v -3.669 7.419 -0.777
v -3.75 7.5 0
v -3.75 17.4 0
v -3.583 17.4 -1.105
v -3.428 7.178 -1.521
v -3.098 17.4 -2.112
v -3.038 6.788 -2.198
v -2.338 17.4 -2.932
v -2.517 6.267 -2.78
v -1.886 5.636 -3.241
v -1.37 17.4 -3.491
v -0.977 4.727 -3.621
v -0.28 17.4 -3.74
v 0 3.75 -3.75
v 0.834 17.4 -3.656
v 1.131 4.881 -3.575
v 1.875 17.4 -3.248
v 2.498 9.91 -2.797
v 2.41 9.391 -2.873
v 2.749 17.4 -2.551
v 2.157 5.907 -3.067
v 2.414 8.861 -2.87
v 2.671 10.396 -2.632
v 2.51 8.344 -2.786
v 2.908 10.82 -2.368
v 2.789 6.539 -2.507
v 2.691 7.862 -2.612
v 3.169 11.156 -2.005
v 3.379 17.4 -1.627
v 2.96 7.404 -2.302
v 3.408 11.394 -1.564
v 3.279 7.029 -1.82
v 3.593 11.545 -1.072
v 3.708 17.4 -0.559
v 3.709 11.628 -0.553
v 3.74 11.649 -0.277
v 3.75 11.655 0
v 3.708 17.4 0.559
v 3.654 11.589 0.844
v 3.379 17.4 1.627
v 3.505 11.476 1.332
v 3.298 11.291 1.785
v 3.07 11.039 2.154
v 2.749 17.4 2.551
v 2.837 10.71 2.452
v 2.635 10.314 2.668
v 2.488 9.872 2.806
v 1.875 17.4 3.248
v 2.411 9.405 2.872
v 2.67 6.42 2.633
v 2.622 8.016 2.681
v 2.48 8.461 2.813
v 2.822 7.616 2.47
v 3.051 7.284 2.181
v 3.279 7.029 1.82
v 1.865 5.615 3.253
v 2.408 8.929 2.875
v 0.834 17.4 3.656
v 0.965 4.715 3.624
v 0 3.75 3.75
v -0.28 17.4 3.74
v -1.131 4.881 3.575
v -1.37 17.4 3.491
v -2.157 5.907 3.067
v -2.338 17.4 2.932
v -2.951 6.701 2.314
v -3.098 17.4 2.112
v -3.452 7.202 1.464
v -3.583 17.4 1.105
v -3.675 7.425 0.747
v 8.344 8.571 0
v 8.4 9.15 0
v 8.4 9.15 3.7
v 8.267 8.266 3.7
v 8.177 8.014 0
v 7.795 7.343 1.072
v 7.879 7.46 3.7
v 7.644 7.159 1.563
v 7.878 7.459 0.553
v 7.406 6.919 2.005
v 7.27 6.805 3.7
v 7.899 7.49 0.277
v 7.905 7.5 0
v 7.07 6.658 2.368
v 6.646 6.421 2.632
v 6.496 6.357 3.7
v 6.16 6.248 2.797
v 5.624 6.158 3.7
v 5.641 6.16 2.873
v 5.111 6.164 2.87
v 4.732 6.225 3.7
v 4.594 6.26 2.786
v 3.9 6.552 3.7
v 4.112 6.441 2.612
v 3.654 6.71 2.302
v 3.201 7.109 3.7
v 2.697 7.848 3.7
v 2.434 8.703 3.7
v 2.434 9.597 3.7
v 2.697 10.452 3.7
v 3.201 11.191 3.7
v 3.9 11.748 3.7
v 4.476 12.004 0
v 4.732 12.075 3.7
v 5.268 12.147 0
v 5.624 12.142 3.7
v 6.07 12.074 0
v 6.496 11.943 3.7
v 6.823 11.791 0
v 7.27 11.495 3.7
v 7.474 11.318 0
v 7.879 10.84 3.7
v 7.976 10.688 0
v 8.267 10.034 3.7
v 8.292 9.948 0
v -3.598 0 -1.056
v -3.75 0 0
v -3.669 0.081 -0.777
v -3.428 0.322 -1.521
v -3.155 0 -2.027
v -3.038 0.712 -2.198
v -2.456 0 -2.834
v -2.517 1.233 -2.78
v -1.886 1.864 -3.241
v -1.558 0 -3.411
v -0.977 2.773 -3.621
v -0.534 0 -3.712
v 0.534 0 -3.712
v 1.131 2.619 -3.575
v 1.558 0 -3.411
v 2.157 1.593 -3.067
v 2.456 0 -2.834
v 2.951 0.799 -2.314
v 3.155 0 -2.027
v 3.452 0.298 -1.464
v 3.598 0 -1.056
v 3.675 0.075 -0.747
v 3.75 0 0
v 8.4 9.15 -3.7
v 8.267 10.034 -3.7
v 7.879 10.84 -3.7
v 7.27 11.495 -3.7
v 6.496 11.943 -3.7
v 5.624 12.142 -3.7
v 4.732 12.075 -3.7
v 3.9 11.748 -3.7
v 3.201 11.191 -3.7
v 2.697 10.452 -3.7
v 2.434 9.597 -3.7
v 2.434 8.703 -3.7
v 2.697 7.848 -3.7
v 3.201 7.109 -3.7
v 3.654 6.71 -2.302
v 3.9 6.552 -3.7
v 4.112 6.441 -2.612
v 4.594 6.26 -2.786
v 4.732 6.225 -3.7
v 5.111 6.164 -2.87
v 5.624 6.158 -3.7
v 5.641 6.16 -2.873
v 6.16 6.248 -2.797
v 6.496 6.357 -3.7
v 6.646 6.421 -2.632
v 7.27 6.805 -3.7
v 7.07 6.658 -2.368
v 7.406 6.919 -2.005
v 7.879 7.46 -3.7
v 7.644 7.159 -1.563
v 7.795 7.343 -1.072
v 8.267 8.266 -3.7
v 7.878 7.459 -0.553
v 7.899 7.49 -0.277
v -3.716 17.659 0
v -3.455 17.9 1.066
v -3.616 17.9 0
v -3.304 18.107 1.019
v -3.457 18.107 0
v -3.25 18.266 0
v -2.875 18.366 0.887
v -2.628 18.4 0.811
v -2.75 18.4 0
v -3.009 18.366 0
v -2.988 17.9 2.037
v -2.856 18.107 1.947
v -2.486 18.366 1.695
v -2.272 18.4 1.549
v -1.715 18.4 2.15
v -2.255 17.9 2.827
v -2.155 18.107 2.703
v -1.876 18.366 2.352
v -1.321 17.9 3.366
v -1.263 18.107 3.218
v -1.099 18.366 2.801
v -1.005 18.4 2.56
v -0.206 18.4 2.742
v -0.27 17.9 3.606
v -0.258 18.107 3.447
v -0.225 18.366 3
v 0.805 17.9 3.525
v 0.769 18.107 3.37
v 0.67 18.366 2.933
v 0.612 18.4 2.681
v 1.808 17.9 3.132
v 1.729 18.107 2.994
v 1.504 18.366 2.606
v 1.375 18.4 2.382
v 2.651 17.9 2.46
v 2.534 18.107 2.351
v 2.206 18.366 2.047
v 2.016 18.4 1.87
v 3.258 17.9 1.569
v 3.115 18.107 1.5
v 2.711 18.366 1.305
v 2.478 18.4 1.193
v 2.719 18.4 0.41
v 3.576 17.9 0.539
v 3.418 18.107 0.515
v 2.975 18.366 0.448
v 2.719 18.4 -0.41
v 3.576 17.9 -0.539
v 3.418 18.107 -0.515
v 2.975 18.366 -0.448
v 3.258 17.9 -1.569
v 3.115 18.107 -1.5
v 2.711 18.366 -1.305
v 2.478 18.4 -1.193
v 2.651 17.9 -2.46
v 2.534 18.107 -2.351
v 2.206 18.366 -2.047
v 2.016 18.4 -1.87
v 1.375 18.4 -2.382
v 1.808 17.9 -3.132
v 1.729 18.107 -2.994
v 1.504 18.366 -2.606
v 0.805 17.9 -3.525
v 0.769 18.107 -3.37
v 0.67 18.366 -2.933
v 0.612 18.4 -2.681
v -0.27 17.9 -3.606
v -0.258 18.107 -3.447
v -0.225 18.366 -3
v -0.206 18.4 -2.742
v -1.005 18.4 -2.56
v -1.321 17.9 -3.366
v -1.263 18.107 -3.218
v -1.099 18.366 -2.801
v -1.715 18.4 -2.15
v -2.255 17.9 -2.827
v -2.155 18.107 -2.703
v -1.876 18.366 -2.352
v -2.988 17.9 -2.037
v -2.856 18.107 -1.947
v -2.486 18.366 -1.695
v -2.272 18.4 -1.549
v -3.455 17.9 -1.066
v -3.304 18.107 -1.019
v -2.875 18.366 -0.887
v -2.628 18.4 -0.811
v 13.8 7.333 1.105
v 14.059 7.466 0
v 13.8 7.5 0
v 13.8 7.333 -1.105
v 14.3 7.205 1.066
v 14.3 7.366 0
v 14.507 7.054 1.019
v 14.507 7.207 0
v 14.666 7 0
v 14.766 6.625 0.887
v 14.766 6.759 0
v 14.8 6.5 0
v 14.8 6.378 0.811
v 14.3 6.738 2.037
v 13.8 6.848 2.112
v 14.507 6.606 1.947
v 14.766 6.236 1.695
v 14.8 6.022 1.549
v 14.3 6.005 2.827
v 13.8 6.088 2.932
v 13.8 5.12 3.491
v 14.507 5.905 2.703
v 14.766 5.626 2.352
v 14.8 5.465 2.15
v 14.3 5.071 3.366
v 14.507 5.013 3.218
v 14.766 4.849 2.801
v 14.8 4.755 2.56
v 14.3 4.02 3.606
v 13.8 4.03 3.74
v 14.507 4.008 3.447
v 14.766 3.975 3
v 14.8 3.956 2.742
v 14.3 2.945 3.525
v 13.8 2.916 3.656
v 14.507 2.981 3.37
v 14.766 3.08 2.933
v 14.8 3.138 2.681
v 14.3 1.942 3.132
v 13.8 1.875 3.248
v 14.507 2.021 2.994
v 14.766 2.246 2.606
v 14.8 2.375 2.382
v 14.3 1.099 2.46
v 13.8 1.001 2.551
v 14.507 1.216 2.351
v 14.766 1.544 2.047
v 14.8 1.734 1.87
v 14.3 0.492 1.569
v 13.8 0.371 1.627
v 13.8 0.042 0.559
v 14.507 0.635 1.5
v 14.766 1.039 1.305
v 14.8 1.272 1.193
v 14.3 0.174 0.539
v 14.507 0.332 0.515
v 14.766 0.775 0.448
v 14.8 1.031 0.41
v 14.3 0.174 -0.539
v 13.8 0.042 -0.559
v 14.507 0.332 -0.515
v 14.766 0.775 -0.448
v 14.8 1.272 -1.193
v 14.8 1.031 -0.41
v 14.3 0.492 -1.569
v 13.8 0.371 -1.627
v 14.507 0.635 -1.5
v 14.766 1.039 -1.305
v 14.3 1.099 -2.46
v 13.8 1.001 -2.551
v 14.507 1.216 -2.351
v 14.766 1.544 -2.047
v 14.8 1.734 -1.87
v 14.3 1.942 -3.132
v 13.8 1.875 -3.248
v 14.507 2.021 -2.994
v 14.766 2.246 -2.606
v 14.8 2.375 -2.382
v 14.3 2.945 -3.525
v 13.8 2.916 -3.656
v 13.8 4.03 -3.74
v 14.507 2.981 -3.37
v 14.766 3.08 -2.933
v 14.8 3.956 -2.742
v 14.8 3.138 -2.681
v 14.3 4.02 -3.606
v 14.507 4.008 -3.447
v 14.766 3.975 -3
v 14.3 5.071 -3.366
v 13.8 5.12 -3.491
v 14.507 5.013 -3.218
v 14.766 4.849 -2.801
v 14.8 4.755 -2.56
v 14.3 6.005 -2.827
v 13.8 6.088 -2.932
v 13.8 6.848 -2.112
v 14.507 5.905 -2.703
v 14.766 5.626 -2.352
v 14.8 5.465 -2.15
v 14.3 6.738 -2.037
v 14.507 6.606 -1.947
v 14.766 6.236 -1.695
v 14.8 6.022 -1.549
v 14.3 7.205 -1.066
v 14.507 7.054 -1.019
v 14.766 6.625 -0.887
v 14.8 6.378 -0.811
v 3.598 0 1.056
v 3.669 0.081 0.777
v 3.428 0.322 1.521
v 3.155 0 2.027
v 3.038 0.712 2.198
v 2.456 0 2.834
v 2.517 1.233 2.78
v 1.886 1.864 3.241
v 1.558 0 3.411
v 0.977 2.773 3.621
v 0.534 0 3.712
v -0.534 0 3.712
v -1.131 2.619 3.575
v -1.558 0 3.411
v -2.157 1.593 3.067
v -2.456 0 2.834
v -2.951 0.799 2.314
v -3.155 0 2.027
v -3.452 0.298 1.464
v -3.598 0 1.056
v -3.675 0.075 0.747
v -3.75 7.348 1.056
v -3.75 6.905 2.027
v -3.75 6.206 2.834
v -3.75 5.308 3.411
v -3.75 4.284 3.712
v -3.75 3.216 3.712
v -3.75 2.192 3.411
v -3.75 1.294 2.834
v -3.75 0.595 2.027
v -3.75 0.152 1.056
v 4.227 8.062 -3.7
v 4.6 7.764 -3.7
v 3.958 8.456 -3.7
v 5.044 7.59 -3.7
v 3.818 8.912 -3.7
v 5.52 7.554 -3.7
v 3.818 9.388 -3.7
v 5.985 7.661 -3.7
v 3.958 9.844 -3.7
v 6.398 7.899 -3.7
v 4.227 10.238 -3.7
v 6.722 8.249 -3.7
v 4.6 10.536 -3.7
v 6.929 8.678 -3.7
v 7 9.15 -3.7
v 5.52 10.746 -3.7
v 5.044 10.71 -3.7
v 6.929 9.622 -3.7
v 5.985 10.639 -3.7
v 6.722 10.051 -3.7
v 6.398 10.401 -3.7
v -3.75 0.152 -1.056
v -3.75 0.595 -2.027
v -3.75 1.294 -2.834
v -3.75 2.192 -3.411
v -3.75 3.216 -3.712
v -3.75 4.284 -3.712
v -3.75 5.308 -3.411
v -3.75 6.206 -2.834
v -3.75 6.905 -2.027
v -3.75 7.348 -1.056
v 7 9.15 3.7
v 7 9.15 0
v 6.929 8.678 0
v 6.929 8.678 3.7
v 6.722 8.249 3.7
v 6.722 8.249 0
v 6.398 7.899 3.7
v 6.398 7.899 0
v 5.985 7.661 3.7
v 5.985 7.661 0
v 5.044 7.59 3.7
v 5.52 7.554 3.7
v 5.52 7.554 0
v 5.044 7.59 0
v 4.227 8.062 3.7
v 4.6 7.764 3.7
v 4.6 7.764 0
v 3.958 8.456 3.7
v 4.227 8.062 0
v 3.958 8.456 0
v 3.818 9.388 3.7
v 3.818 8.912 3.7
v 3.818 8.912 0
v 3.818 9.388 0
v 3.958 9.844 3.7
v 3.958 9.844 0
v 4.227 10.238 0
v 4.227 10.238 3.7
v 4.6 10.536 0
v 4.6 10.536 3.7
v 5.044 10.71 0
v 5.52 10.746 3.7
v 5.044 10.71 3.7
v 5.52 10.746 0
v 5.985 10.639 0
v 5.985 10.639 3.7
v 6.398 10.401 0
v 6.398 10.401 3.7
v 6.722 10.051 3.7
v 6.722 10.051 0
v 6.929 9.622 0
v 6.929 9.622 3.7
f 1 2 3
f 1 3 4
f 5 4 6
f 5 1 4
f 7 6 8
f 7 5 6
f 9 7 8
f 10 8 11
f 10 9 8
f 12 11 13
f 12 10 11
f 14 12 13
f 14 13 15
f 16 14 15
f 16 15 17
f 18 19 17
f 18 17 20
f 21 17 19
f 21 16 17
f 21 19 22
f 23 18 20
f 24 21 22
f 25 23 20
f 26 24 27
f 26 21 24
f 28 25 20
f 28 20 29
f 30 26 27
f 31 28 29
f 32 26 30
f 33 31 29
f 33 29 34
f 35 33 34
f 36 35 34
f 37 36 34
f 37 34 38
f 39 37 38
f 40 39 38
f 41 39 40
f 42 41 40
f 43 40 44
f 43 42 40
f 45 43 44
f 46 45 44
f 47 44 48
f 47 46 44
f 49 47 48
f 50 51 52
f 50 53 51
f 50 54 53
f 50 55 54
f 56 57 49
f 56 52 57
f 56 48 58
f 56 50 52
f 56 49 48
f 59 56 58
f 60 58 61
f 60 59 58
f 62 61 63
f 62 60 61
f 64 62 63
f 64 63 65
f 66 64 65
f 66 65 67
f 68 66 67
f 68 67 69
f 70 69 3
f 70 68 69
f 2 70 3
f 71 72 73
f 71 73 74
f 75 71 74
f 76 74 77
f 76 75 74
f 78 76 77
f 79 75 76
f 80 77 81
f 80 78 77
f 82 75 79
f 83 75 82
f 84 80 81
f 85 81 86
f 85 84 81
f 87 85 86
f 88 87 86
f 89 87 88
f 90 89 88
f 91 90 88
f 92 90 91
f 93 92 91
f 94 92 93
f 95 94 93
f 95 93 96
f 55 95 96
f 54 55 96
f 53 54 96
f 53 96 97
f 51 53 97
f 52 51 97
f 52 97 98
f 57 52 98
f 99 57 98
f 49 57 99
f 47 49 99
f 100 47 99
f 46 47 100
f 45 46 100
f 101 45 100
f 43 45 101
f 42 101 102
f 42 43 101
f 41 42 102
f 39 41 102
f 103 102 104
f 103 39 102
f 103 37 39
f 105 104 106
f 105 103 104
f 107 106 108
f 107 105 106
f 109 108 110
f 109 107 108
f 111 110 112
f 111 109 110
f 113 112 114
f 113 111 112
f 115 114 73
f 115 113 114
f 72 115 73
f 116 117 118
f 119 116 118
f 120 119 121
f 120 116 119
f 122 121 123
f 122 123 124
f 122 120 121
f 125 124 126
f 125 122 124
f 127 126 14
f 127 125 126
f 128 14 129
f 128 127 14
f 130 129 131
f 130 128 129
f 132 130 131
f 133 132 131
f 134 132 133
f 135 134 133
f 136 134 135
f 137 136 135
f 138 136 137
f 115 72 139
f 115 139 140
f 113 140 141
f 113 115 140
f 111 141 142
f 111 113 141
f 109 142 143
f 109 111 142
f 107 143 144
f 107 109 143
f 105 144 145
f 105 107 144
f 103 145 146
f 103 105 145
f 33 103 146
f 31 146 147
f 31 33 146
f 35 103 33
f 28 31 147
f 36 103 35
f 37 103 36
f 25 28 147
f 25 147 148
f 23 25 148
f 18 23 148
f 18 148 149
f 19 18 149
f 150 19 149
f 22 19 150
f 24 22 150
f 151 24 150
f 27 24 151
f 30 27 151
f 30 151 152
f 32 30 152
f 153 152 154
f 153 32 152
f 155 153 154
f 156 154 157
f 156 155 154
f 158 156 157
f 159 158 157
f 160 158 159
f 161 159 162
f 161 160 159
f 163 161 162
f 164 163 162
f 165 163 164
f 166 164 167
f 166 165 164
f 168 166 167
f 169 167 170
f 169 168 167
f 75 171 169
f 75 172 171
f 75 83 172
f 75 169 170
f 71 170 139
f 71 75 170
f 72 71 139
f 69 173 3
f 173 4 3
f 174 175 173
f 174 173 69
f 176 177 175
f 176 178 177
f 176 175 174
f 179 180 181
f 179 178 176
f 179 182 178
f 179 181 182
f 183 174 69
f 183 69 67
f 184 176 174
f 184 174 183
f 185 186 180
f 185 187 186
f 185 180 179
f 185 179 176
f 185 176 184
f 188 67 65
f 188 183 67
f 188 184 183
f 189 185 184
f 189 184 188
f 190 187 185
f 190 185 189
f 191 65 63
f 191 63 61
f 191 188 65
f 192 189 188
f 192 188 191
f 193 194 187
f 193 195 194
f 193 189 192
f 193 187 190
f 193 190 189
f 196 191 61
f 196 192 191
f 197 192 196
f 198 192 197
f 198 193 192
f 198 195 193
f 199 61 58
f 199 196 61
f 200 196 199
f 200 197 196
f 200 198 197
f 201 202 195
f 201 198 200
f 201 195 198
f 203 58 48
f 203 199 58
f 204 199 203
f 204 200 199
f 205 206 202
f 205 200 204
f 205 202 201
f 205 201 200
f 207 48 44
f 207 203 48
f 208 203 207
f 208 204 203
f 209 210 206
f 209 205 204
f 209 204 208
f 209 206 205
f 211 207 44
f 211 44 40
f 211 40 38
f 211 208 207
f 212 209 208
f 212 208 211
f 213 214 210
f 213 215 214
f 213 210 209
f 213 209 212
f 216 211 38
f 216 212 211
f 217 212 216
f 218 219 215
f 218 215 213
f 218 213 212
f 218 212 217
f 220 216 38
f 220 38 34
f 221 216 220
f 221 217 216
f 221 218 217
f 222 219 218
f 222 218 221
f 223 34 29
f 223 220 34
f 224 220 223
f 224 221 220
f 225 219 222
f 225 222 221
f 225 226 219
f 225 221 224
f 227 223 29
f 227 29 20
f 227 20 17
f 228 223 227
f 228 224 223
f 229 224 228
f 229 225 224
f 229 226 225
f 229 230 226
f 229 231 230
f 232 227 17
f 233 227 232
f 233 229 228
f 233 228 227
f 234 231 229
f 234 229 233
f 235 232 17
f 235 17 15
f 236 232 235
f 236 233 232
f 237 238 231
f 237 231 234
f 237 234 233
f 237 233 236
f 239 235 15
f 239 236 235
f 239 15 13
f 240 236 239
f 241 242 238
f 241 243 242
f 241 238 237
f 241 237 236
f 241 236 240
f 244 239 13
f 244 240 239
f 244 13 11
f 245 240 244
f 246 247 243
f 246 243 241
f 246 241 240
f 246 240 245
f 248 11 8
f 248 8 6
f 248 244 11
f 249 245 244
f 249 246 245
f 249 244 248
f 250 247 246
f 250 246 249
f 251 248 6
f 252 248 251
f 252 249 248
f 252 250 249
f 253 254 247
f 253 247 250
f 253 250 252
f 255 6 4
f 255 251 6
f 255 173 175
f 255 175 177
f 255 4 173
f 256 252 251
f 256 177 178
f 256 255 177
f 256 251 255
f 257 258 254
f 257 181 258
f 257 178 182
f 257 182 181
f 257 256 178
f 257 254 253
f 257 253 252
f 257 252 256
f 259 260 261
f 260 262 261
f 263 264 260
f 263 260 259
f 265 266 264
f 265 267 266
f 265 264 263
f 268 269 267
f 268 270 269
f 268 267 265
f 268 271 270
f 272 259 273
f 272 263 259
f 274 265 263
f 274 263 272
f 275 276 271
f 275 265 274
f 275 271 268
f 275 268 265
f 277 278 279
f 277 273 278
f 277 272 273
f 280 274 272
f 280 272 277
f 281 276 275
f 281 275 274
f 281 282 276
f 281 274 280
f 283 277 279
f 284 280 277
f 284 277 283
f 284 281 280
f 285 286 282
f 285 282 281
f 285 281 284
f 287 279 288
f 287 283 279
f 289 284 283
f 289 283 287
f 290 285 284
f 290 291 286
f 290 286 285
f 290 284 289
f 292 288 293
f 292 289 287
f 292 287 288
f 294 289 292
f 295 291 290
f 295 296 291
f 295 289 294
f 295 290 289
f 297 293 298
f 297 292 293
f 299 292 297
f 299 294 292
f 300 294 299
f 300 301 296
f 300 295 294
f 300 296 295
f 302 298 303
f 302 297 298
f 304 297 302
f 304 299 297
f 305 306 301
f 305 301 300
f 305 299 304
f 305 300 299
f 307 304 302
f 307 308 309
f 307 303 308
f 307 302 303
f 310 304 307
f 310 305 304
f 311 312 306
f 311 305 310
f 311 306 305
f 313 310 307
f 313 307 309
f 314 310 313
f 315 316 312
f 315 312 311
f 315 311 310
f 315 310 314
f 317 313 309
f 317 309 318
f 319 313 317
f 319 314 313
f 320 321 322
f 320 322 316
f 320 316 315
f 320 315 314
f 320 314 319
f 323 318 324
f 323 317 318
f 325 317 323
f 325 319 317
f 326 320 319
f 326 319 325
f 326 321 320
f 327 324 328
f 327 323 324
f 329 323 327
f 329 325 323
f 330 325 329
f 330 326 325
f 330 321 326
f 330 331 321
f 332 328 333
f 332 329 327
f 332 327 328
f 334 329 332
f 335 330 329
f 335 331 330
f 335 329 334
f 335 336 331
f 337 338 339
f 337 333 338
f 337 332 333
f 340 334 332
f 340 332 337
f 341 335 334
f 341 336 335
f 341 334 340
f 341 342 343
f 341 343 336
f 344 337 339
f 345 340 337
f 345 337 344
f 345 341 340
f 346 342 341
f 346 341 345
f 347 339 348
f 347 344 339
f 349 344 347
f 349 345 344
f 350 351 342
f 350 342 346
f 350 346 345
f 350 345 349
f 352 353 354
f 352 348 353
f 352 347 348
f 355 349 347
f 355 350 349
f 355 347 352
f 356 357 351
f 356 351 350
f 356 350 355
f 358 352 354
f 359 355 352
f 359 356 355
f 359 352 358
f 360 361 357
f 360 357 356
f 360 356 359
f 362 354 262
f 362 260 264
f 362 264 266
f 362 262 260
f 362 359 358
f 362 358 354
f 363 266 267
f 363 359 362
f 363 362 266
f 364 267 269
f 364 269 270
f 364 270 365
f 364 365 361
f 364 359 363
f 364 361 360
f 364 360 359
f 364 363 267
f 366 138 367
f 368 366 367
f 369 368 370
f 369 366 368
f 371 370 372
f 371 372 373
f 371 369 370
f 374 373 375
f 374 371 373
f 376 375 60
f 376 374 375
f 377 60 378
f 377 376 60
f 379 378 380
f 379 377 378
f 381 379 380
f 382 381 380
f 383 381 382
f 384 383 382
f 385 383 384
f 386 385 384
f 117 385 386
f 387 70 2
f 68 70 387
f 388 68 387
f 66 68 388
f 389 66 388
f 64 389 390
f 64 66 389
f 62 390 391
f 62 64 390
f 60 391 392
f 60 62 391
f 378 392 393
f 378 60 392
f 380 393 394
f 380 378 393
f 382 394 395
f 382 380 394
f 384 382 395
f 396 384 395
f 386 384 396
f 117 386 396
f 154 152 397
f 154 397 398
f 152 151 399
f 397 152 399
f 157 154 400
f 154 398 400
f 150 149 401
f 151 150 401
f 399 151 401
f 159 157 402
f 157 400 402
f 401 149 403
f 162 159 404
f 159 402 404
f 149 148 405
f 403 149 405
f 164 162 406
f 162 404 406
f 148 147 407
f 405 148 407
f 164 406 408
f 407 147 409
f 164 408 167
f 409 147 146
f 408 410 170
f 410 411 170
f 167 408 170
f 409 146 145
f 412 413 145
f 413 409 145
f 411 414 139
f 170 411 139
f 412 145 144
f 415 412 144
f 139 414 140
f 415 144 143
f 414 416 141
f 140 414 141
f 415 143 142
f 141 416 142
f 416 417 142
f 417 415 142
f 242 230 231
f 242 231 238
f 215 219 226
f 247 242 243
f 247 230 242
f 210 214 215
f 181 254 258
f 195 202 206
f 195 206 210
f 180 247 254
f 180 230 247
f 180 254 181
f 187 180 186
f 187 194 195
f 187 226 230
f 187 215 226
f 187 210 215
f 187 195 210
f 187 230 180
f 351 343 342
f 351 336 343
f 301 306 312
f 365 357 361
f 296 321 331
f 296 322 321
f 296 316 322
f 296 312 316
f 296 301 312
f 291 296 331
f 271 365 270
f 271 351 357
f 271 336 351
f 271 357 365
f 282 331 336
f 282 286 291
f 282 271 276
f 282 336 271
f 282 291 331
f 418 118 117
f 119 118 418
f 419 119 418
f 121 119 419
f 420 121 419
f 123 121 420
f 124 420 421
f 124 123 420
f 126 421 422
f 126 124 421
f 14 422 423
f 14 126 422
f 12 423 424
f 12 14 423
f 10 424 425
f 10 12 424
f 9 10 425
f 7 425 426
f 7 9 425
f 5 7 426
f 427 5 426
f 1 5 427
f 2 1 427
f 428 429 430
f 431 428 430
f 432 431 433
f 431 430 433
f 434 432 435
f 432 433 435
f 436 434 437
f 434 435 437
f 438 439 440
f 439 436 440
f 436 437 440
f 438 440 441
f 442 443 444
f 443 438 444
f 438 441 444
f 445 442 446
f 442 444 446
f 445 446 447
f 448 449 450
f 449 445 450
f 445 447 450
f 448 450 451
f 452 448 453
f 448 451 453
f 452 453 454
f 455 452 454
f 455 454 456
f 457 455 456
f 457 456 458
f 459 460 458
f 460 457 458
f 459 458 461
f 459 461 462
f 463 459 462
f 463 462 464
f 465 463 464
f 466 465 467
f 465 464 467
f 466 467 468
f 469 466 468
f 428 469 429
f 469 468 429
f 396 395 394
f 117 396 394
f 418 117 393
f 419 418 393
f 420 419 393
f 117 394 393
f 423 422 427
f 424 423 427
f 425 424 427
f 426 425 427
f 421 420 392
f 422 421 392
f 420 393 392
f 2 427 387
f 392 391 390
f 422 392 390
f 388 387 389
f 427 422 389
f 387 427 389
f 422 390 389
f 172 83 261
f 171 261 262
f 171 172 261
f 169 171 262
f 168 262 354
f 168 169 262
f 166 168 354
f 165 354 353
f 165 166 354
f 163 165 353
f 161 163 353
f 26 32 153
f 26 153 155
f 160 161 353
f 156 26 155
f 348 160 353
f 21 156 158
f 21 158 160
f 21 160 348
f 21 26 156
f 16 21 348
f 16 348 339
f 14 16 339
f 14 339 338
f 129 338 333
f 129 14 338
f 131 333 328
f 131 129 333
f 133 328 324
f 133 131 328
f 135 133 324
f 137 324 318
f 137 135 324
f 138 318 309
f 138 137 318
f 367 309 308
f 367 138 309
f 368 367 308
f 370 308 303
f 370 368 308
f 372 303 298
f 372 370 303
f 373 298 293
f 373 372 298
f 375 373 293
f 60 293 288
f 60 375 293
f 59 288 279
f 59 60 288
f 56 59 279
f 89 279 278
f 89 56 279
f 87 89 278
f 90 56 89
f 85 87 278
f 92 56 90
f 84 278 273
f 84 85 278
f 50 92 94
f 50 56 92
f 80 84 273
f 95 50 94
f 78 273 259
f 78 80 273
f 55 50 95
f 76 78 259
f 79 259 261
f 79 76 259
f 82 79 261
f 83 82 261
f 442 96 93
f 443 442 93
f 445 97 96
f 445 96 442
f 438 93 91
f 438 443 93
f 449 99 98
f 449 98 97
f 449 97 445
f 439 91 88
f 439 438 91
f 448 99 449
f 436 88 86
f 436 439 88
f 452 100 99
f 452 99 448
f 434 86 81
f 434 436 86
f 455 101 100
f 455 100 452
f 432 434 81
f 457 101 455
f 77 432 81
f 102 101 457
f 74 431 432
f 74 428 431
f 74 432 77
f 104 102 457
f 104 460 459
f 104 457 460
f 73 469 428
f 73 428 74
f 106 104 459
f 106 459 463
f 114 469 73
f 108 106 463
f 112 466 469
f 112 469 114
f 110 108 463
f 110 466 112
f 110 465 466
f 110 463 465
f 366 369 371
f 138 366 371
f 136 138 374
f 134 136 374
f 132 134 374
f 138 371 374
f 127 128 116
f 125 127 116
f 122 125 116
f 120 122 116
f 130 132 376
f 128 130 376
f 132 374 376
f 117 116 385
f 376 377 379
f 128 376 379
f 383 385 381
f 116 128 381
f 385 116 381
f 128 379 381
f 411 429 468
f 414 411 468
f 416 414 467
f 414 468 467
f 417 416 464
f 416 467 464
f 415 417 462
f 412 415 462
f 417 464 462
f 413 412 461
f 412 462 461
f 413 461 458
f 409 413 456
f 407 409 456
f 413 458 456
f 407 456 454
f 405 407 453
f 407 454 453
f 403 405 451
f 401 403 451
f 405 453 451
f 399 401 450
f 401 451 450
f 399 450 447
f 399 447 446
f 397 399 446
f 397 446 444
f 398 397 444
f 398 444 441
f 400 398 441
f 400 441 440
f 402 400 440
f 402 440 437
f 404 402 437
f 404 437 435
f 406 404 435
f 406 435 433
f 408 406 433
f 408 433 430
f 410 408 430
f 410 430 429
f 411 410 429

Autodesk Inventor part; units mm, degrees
ref_plane "YZ Plane" through (0, 0, 0) normal (1, 0, 0) x (0, 1, 0)
ref_plane "XZ Plane" through (0, 0, 0) normal (0, 1, 0) x (-1, 0, 0)
ref_plane "XY Plane" through (0, 0, 0) normal (0, 0, 1) x (1, 0, 0)
sketch "Sketch1" plane through (0, 0, 0) normal (0, 1, 0) x (-1, 0, 0)
  circle A0 centre (0, 0) radius 3.75
  dimension "d0" = 7.5
extrude "Extrusion1" add sketch "Sketch1" along normal blind 18.4
sketch "Sketch2" plane through (0, 0, 0) normal (1, 0, 0) x (0, 1, 0)
  circle A0 centre (3.75, 0) radius 3.75
  line L0 (0, -3.75) -> (0, 3.75) projected
  point P0 (0, 0)
  dimension "d3" = 7.5
extrude "Extrusion2" add sketch "Sketch2" along normal blind 14.8 and the other way blind 3.75
sketch "Sketch3" plane through (0, 0, 0) normal (0, 0, 1) x (1, 0, 0)
  line L0 (17.8168, 3.75) -> (-11.5413, 3.75) construction
  line L1 (0, 19.7284) -> (0, -6.0231) construction
  line L2 (0, 3.75) -> (0, 3.75) construction
  line L3 (0, 3.75) -> (-3.75, 7.5) construction
  line L4 (-3.75, 7.5) -> (0, 3.75) construction
  line L5 (3.75, 18.4) -> (-3.75, 18.4) construction
  line L6 (0, 3.75) -> (3.75, 0) construction
  line L7 (0, 3.75) -> (0, 3.75) construction
  line L8 (3.75, 0) -> (0, 3.75) construction
  line L9 (14.8, 0) -> (14.8, 7.5) construction
  circle A0 centre (5.4, 9.15) radius 1.6
  circle A1 centre (5.4, 9.15) radius 3
  point P0 (0, 0)
  point P1 (0, 18.4)
  point P2 (14.8, 3.75)
  dimension "d8" = 5.4
  dimension "d9" = 5.4
  dimension "d10" = 3.2
  dimension "d11" = 6
extrude "Extrusion3" add sketch "Sketch3" along normal mid plane 7.4
fillet "Fillet1" radius 1 2 edges at (3.75, 18.4, 0) (14.8, 0, 0)
properties part number "Union Elbow 1-8 KQ2L01-00A SMC"
